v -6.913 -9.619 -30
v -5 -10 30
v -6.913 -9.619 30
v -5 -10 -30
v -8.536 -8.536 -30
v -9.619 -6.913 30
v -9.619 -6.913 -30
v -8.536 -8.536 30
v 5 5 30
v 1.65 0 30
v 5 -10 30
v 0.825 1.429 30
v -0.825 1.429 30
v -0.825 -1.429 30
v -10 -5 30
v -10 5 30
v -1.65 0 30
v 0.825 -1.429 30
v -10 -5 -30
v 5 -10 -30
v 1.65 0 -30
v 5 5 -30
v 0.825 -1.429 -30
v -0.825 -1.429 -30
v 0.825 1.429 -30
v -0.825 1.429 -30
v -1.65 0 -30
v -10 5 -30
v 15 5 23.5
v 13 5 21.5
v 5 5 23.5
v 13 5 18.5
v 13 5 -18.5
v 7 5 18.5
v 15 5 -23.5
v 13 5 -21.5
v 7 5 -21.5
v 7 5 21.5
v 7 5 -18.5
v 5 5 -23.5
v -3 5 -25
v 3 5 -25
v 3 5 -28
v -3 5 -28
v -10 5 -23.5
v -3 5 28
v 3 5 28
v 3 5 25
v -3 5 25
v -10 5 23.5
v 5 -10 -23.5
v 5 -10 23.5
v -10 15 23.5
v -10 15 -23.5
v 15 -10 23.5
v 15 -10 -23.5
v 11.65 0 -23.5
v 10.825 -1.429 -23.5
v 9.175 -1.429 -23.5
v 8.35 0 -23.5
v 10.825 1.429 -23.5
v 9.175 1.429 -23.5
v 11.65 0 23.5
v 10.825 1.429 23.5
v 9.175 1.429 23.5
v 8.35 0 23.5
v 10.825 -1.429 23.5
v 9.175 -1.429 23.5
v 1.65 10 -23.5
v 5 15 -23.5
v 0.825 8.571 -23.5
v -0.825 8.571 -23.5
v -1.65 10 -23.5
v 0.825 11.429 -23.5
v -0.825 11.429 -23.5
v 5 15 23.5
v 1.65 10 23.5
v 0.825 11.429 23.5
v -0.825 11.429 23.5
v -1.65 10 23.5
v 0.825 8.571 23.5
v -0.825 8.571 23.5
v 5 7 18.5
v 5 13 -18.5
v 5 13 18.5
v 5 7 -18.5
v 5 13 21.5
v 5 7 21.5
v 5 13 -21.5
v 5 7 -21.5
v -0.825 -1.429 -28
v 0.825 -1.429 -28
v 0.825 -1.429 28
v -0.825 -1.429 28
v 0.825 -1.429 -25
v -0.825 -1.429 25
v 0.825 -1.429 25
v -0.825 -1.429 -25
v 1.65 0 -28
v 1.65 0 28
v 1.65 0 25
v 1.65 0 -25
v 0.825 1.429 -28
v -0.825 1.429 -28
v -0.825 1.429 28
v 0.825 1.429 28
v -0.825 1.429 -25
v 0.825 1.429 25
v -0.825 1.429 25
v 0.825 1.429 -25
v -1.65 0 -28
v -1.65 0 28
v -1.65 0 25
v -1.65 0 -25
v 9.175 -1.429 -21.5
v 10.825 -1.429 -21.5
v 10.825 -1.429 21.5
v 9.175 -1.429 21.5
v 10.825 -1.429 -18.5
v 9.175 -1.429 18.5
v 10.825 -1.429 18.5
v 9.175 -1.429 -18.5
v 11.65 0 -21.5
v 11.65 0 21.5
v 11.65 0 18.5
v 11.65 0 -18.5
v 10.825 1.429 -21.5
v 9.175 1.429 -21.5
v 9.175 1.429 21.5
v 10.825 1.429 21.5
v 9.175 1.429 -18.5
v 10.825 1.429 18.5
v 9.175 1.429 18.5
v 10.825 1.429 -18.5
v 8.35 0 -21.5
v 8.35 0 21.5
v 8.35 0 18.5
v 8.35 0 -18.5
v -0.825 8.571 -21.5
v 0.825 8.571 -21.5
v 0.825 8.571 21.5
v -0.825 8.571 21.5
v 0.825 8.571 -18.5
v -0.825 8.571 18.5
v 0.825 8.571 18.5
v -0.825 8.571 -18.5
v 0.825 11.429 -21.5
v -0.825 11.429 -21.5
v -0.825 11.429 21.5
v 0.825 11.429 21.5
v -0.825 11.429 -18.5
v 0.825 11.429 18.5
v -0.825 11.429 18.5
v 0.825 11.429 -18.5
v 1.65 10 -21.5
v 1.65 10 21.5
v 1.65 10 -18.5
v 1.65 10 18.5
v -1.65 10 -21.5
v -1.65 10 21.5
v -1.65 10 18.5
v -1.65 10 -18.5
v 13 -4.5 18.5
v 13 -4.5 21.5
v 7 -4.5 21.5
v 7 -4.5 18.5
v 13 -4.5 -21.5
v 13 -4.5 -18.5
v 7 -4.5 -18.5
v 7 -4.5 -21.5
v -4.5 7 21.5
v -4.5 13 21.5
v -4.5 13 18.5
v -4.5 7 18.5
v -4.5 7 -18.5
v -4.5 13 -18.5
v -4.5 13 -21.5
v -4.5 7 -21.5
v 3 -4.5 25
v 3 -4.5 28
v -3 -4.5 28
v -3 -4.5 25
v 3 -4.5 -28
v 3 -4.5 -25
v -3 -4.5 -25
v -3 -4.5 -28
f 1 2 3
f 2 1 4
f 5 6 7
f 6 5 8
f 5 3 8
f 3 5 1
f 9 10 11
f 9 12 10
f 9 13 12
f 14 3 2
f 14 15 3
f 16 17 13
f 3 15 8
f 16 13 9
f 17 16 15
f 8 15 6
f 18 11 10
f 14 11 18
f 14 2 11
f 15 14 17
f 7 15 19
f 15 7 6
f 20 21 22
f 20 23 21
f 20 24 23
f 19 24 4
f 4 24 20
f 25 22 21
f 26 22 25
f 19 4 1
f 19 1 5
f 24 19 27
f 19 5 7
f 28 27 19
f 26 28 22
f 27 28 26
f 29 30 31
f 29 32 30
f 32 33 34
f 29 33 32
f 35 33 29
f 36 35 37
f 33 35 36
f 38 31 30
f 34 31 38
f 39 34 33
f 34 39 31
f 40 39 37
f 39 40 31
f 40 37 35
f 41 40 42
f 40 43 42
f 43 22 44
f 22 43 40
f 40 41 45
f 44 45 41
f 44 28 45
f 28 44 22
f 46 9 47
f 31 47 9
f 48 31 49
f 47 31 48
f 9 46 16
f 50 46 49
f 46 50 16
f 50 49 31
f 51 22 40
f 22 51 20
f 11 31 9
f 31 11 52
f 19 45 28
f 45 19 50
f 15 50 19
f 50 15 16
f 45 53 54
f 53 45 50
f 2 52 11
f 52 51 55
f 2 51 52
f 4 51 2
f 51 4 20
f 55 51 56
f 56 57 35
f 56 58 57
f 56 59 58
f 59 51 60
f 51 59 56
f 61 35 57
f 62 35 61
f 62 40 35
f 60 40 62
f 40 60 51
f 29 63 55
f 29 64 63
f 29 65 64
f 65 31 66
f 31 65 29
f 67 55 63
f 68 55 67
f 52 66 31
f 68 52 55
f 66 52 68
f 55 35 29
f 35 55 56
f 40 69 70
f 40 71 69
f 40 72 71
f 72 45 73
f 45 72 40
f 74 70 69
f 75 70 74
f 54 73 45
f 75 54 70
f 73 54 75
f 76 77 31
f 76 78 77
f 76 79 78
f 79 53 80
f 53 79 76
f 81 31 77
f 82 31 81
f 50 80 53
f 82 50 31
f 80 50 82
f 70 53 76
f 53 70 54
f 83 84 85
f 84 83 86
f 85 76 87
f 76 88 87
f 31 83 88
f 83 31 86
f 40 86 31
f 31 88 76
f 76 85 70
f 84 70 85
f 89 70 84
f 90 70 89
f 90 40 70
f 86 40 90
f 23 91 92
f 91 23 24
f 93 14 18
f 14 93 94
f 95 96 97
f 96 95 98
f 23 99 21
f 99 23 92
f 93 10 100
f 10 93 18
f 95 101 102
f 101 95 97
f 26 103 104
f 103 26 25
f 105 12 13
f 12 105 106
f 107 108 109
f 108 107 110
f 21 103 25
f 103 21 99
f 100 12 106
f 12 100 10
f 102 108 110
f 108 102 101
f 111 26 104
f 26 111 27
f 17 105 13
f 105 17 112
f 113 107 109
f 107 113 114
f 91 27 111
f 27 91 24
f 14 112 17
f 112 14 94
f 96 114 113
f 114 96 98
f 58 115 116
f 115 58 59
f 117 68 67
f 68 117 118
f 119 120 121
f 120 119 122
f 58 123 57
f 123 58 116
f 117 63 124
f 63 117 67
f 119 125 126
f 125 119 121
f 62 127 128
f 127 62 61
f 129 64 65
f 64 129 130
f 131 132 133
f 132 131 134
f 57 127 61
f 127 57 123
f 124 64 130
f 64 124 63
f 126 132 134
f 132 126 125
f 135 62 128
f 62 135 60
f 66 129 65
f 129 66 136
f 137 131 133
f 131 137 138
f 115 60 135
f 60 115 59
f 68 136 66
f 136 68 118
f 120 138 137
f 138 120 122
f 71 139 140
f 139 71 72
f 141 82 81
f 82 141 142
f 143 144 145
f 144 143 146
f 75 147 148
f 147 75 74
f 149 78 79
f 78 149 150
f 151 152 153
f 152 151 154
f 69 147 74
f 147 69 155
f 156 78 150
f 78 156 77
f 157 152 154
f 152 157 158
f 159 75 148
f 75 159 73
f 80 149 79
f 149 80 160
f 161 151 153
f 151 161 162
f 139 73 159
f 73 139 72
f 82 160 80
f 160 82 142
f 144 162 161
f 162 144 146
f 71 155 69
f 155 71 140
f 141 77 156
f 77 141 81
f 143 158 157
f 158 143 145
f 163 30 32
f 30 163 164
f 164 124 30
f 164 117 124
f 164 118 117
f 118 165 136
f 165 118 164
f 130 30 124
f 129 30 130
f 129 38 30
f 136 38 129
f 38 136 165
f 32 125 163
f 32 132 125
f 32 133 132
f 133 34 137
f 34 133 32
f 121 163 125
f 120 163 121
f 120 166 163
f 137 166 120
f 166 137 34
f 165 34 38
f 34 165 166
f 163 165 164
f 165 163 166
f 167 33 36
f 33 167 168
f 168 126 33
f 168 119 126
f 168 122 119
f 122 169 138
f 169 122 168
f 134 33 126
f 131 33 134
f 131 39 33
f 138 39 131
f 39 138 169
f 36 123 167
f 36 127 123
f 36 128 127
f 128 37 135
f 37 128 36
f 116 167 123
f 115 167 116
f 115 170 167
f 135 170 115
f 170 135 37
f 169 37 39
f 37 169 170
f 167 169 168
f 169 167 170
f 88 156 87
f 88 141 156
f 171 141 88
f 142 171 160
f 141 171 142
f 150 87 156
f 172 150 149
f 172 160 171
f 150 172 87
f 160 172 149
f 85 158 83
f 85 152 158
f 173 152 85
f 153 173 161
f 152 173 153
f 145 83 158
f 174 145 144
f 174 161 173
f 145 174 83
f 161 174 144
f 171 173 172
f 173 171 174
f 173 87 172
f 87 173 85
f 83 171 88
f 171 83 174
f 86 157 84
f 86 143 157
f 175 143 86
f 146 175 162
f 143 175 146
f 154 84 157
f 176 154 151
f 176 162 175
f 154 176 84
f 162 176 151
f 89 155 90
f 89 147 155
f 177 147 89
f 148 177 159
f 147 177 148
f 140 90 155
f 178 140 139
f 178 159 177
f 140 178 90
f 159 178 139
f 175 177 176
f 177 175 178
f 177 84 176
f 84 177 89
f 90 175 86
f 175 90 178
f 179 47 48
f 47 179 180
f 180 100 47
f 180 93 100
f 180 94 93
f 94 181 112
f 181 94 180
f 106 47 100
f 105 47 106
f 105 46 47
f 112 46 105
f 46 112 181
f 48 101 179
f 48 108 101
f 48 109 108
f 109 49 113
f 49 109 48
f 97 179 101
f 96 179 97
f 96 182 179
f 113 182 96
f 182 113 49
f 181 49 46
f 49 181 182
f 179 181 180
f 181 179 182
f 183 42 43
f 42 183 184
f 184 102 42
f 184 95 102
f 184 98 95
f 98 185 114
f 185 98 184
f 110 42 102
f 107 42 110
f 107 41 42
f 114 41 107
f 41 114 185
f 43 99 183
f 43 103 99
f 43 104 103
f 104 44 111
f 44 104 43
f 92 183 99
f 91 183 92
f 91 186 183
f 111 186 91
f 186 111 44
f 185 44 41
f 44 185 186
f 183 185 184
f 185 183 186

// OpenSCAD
vyska = 60;  //celeho sloupku
zapust = 6.5; //vyska zapusteni listy 
vzdalenost_der = 10; //roztec upevňovacich der
vzdalenost_od_okraje = 10; //vzdalenost stredu upevnovaci diry od kraje desky
vzdalenost_od_diry = 5; //vzdalenost od stredu upevnovaci diry na druhou stranu
radidus_hrany = 5; //radius zaobleni

//parametry šroubu
prumer_sroubu=3.3;


//parametry matice
prumer_matice=6; //hrany k hraně
vyska_matice=3;  //vyska matice
posuv_dorazu=0;  //pro moznost posuvu dorazu pro vsunutí matice
matice_sila_materialu=2; //sila materialu pod/nad maticí na ose z

difference () {
union () {
color("green")
    translate([-(vzdalenost_od_okraje-radidus_hrany),-(vzdalenost_od_okraje-radidus_hrany),0])  // center top screw
        cylinder(vyska, d=(2*radidus_hrany), center=true);

color("cyan")
    translate([vzdalenost_der/4, vzdalenost_der/4, -vyska/2])
        linear_extrude(height = vyska)
            square([vzdalenost_der/2, vzdalenost_der/2], center = true);    

color("gray")
    translate([-vzdalenost_od_okraje/2, vzdalenost_der/4, -vyska/2])
        linear_extrude(height = vyska)
            square([(vzdalenost_od_okraje), vzdalenost_der/2], center = true);  
    
color("gray")
    translate([vzdalenost_der/4, -vzdalenost_od_okraje/2, -vyska/2])
        linear_extrude(height = vyska)
            square([vzdalenost_der/2, vzdalenost_od_okraje], center = true); 
    
color("red")
    translate([-(vzdalenost_od_okraje-radidus_hrany)/2, -vzdalenost_od_okraje/2, -vyska/2])
        linear_extrude(height = vyska)
            square([vzdalenost_od_okraje-radidus_hrany, vzdalenost_od_okraje], center = true); 
   
color("red")
    translate([-vzdalenost_od_okraje/2,-(vzdalenost_od_okraje-radidus_hrany)/2, -vyska/2])
        linear_extrude(height = vyska)
            square([vzdalenost_od_okraje, vzdalenost_od_okraje-radidus_hrany], center = true); 

color("green")
    translate([vzdalenost_der, -vzdalenost_od_okraje/2, -(vyska-(2*zapust))/2])
        linear_extrude(height = (vyska-(2*zapust)))
            square([vzdalenost_der, vzdalenost_od_okraje], center = true); 
            
color("red")
    translate([-vzdalenost_od_okraje/2,vzdalenost_der, -(vyska-(2*zapust))/2])
        linear_extrude(height = (vyska-(2*zapust)))
            square([ vzdalenost_od_okraje,vzdalenost_der], center = true);             
  
 color("cyan")
    translate([vzdalenost_od_diry/2, vzdalenost_der, -(vyska-(2*zapust))/2])
        linear_extrude(height = (vyska-(2*zapust)))
            square([(vzdalenost_od_diry), vzdalenost_der], center = true);  
  
 color("cyan")
    translate([vzdalenost_der, vzdalenost_od_diry/2, -(vyska-(2*zapust))/2])
        linear_extrude(height = (vyska-(2*zapust)))
            square([vzdalenost_der, vzdalenost_od_diry ], center = true);  
  
}

//diry na sroub
    translate([0,0,0])  // center top screw
        cylinder(2*vyska, d=(prumer_sroubu), center=true);

    translate([vzdalenost_der,0,0])  // center top screw
        cylinder(2*vyska, d=(prumer_sroubu), center=true);

    translate([0,vzdalenost_der,0])  // center top screw
        cylinder(2*vyska, d=(prumer_sroubu), center=true);

//diry na matice
//1. krajni matice
translate([vzdalenost_der,(((((prumer_matice)/2)+posuv_dorazu+vzdalenost_od_diry)/2)-(posuv_dorazu+prumer_matice/2)),((vyska-2*zapust)/2-vyska_matice/2)-matice_sila_materialu])  // center top screw
      
cube([prumer_matice, prumer_matice+posuv_dorazu+vzdalenost_od_diry,vyska_matice], center = true);

translate([vzdalenost_der,(((((prumer_matice)/2)+posuv_dorazu+vzdalenost_od_diry)/2)-(posuv_dorazu+prumer_matice/2)),-(((vyska-2*zapust)/2-vyska_matice/2)-matice_sila_materialu)])  // center top screw
      
cube([prumer_matice, prumer_matice+posuv_dorazu+vzdalenost_od_diry,vyska_matice], center = true);


//2. krajni matice
translate([(((((prumer_matice)/2)+posuv_dorazu+vzdalenost_od_diry)/2)-(posuv_dorazu+prumer_matice/2)), vzdalenost_der,((vyska-2*zapust)/2-vyska_matice/2)-matice_sila_materialu])  // center top screw
      
cube([ prumer_matice+posuv_dorazu+vzdalenost_od_diry,prumer_matice,vyska_matice], center = true);

translate([(((((prumer_matice)/2)+posuv_dorazu+vzdalenost_od_diry)/2)-(posuv_dorazu+prumer_matice/2)), vzdalenost_der,-(((vyska-2*zapust)/2-vyska_matice/2)-matice_sila_materialu)])  // center top screw
      
cube([ prumer_matice+posuv_dorazu+vzdalenost_od_diry,prumer_matice,vyska_matice], center = true);

//prostredni dira
translate([0,(((((prumer_matice)/2)+posuv_dorazu+vzdalenost_od_diry)/2)-(posuv_dorazu+prumer_matice/2)),((vyska)/2-vyska_matice/2)-matice_sila_materialu])  // center top screw
      
cube([prumer_matice, prumer_matice+posuv_dorazu+vzdalenost_od_diry,vyska_matice], center = true);

translate([0,(((((prumer_matice)/2)+posuv_dorazu+vzdalenost_od_diry)/2)-(posuv_dorazu+prumer_matice/2)),-(((vyska)/2-vyska_matice/2)-matice_sila_materialu)])  // center top screw
      
cube([prumer_matice, prumer_matice+posuv_dorazu+vzdalenost_od_diry,vyska_matice], center = true);


}
